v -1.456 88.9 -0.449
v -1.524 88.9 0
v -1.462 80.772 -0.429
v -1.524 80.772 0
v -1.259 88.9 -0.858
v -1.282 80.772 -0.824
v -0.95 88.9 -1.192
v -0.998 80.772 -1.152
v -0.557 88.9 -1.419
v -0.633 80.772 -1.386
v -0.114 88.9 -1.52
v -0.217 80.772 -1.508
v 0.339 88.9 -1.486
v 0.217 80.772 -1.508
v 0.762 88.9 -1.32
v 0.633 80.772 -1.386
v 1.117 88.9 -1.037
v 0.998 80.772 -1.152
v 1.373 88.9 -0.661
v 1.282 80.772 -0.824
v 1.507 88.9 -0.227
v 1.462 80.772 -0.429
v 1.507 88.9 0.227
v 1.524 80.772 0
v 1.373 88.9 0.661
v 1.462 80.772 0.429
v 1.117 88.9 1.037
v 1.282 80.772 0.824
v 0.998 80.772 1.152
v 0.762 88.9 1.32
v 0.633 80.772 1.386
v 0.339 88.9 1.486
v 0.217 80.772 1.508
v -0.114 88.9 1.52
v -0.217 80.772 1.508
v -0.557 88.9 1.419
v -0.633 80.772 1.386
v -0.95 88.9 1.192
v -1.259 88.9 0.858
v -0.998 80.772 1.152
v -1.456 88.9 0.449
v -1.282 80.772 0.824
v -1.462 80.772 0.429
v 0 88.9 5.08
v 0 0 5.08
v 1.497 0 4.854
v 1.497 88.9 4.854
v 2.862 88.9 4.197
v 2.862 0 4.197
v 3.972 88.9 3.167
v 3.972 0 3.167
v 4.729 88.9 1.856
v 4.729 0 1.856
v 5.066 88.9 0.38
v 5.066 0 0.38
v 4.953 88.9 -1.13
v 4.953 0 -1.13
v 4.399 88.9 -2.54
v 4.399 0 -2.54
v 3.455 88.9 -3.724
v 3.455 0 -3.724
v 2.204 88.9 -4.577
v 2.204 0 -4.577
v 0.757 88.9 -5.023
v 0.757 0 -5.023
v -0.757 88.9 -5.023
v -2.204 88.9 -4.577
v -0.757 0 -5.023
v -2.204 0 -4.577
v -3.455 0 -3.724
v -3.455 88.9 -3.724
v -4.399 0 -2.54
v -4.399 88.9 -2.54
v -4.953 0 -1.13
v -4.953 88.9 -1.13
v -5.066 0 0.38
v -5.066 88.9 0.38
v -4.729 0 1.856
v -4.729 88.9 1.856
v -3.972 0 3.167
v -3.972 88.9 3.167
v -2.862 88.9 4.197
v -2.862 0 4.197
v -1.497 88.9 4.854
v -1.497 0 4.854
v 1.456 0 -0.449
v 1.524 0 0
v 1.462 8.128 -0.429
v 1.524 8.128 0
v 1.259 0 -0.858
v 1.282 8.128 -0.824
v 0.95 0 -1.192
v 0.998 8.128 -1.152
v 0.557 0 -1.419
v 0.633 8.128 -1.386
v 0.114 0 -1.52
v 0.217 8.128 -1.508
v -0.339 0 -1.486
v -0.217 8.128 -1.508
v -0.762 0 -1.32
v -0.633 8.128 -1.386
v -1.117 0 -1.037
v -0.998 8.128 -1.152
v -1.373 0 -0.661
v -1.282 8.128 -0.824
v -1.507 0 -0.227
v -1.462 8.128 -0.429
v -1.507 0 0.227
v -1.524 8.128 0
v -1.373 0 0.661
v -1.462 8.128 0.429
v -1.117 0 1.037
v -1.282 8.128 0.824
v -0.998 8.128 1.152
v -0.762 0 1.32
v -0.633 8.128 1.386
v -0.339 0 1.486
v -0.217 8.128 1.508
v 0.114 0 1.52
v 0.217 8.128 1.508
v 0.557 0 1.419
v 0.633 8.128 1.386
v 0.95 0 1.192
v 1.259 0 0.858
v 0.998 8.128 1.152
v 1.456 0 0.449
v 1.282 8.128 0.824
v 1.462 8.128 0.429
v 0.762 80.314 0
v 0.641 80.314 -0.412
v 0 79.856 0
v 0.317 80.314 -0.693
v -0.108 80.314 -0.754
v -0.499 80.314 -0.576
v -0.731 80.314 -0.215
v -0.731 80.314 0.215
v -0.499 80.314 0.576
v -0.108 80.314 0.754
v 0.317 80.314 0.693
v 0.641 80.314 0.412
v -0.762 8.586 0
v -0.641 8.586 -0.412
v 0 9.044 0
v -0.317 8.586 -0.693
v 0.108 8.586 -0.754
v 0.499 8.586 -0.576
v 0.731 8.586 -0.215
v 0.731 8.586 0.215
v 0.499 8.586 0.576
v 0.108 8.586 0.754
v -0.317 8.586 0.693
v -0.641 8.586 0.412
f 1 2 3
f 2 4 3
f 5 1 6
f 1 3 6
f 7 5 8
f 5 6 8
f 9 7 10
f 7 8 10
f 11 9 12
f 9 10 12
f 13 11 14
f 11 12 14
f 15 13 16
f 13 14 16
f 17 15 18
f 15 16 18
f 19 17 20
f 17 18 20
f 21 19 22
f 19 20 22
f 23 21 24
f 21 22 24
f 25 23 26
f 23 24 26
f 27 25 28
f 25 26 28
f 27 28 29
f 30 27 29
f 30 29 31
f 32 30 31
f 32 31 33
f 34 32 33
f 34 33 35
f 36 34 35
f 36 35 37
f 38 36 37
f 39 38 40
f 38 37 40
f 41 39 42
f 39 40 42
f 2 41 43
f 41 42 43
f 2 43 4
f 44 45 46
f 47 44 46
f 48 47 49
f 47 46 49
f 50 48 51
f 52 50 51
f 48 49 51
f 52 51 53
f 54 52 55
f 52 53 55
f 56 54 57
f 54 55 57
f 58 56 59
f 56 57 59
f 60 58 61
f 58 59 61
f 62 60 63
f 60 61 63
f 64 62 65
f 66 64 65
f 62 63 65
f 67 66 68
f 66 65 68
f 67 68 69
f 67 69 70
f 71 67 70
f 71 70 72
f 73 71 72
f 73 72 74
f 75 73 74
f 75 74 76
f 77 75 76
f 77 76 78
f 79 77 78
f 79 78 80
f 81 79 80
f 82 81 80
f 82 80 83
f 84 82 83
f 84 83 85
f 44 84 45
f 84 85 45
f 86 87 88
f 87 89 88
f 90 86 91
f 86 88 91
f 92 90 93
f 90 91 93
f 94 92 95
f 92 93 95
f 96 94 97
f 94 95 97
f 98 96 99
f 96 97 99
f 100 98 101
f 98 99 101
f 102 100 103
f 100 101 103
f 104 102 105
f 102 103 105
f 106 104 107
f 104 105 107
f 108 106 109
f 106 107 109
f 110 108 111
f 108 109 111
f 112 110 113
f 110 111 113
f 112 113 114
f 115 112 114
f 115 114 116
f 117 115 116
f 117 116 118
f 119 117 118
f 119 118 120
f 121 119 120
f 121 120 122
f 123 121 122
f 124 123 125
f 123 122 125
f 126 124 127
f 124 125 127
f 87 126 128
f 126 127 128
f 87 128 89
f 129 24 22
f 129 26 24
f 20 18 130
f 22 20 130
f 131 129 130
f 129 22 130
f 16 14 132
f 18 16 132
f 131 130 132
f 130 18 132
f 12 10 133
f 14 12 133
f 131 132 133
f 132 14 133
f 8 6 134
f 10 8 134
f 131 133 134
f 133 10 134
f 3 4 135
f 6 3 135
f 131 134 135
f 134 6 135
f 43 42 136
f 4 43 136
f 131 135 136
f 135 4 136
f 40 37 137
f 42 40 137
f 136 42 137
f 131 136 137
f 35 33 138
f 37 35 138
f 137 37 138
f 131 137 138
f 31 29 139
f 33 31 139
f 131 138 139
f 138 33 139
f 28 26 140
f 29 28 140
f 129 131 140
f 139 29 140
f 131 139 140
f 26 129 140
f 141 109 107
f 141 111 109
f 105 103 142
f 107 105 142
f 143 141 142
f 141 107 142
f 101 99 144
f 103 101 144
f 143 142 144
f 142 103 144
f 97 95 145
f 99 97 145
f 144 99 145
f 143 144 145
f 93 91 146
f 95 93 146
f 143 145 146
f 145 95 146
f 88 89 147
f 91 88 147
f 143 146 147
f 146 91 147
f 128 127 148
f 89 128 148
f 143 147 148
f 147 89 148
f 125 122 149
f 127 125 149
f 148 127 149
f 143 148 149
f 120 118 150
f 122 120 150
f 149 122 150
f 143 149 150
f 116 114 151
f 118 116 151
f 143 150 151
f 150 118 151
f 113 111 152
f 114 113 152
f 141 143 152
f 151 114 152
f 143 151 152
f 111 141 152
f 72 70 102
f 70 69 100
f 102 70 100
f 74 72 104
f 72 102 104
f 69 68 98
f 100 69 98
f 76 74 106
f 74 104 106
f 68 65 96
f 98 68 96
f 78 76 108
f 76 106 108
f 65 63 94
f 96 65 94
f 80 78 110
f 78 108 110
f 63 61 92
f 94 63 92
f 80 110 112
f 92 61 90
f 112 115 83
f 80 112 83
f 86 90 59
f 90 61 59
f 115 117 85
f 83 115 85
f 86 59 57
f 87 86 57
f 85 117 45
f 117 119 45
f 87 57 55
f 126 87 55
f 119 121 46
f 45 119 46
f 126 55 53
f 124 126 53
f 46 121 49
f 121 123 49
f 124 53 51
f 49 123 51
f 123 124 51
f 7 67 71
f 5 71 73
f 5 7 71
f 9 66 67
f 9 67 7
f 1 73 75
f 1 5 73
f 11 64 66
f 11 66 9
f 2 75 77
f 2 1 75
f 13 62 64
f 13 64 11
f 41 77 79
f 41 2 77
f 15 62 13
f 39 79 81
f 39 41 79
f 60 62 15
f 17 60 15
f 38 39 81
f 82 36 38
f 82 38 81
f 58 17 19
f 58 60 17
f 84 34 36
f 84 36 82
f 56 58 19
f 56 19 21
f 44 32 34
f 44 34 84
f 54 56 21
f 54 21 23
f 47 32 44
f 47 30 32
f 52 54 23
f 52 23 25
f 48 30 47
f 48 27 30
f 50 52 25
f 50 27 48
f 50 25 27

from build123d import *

# Parameters (mm, degrees)
SKETCH1_R                            = 5.08
BOSS_EXTRUDE1_DEPTH                  = 88.9
TAPPED_HOLE_FOR_4_40_HELICOIL1_D     = 3.048
TAPPED_HOLE_FOR_4_40_HELICOIL1_DEPTH = 8.128
TAPPED_HOLE_FOR_4_40_HELICOIL1_TIP   = 0.915711583
TAPPED_HOLE_FOR_4_40_HELICOIL2_D     = 3.048
TAPPED_HOLE_FOR_4_40_HELICOIL2_DEPTH = 8.128
TAPPED_HOLE_FOR_4_40_HELICOIL2_TIP   = 0.915711583


with BuildPart() as part:
    # Sketch1 → Boss-Extrude1 (new body)
    with BuildSketch(Plane(origin=(0, 0, 0), x_dir=(1, 0, 0), z_dir=(0, 1, 0))):
        with Locations(Location((0, 0, 0), (0, 0, 270))):
            Circle(SKETCH1_R)
    extrude(amount=BOSS_EXTRUDE1_DEPTH)

    # Tapped Hole for #4-40 Helicoil1
    with Locations(Plane(origin=(0, 88.9, 0), x_dir=(1, 0, 0), z_dir=(0, 1, 0))):
        with Locations((0, 0)):
            Hole(TAPPED_HOLE_FOR_4_40_HELICOIL1_D / 2, depth=TAPPED_HOLE_FOR_4_40_HELICOIL1_DEPTH)
            with Locations((0, 0, -(TAPPED_HOLE_FOR_4_40_HELICOIL1_DEPTH + TAPPED_HOLE_FOR_4_40_HELICOIL1_TIP / 2))):  # 118° drill point
                Cone(0, TAPPED_HOLE_FOR_4_40_HELICOIL1_D / 2, TAPPED_HOLE_FOR_4_40_HELICOIL1_TIP, mode=Mode.SUBTRACT)

    # Tapped Hole for #4-40 Helicoil2
    with Locations(Plane(origin=(0, 0, 0), x_dir=(-1, 0, 0), z_dir=(0, -1, 0))):
        with Locations((0, 0)):
            Hole(TAPPED_HOLE_FOR_4_40_HELICOIL2_D / 2, depth=TAPPED_HOLE_FOR_4_40_HELICOIL2_DEPTH)
            with Locations((0, 0, -(TAPPED_HOLE_FOR_4_40_HELICOIL2_DEPTH + TAPPED_HOLE_FOR_4_40_HELICOIL2_TIP / 2))):  # 118° drill point
                Cone(0, TAPPED_HOLE_FOR_4_40_HELICOIL2_D / 2, TAPPED_HOLE_FOR_4_40_HELICOIL2_TIP, mode=Mode.SUBTRACT)


solid = part.part
